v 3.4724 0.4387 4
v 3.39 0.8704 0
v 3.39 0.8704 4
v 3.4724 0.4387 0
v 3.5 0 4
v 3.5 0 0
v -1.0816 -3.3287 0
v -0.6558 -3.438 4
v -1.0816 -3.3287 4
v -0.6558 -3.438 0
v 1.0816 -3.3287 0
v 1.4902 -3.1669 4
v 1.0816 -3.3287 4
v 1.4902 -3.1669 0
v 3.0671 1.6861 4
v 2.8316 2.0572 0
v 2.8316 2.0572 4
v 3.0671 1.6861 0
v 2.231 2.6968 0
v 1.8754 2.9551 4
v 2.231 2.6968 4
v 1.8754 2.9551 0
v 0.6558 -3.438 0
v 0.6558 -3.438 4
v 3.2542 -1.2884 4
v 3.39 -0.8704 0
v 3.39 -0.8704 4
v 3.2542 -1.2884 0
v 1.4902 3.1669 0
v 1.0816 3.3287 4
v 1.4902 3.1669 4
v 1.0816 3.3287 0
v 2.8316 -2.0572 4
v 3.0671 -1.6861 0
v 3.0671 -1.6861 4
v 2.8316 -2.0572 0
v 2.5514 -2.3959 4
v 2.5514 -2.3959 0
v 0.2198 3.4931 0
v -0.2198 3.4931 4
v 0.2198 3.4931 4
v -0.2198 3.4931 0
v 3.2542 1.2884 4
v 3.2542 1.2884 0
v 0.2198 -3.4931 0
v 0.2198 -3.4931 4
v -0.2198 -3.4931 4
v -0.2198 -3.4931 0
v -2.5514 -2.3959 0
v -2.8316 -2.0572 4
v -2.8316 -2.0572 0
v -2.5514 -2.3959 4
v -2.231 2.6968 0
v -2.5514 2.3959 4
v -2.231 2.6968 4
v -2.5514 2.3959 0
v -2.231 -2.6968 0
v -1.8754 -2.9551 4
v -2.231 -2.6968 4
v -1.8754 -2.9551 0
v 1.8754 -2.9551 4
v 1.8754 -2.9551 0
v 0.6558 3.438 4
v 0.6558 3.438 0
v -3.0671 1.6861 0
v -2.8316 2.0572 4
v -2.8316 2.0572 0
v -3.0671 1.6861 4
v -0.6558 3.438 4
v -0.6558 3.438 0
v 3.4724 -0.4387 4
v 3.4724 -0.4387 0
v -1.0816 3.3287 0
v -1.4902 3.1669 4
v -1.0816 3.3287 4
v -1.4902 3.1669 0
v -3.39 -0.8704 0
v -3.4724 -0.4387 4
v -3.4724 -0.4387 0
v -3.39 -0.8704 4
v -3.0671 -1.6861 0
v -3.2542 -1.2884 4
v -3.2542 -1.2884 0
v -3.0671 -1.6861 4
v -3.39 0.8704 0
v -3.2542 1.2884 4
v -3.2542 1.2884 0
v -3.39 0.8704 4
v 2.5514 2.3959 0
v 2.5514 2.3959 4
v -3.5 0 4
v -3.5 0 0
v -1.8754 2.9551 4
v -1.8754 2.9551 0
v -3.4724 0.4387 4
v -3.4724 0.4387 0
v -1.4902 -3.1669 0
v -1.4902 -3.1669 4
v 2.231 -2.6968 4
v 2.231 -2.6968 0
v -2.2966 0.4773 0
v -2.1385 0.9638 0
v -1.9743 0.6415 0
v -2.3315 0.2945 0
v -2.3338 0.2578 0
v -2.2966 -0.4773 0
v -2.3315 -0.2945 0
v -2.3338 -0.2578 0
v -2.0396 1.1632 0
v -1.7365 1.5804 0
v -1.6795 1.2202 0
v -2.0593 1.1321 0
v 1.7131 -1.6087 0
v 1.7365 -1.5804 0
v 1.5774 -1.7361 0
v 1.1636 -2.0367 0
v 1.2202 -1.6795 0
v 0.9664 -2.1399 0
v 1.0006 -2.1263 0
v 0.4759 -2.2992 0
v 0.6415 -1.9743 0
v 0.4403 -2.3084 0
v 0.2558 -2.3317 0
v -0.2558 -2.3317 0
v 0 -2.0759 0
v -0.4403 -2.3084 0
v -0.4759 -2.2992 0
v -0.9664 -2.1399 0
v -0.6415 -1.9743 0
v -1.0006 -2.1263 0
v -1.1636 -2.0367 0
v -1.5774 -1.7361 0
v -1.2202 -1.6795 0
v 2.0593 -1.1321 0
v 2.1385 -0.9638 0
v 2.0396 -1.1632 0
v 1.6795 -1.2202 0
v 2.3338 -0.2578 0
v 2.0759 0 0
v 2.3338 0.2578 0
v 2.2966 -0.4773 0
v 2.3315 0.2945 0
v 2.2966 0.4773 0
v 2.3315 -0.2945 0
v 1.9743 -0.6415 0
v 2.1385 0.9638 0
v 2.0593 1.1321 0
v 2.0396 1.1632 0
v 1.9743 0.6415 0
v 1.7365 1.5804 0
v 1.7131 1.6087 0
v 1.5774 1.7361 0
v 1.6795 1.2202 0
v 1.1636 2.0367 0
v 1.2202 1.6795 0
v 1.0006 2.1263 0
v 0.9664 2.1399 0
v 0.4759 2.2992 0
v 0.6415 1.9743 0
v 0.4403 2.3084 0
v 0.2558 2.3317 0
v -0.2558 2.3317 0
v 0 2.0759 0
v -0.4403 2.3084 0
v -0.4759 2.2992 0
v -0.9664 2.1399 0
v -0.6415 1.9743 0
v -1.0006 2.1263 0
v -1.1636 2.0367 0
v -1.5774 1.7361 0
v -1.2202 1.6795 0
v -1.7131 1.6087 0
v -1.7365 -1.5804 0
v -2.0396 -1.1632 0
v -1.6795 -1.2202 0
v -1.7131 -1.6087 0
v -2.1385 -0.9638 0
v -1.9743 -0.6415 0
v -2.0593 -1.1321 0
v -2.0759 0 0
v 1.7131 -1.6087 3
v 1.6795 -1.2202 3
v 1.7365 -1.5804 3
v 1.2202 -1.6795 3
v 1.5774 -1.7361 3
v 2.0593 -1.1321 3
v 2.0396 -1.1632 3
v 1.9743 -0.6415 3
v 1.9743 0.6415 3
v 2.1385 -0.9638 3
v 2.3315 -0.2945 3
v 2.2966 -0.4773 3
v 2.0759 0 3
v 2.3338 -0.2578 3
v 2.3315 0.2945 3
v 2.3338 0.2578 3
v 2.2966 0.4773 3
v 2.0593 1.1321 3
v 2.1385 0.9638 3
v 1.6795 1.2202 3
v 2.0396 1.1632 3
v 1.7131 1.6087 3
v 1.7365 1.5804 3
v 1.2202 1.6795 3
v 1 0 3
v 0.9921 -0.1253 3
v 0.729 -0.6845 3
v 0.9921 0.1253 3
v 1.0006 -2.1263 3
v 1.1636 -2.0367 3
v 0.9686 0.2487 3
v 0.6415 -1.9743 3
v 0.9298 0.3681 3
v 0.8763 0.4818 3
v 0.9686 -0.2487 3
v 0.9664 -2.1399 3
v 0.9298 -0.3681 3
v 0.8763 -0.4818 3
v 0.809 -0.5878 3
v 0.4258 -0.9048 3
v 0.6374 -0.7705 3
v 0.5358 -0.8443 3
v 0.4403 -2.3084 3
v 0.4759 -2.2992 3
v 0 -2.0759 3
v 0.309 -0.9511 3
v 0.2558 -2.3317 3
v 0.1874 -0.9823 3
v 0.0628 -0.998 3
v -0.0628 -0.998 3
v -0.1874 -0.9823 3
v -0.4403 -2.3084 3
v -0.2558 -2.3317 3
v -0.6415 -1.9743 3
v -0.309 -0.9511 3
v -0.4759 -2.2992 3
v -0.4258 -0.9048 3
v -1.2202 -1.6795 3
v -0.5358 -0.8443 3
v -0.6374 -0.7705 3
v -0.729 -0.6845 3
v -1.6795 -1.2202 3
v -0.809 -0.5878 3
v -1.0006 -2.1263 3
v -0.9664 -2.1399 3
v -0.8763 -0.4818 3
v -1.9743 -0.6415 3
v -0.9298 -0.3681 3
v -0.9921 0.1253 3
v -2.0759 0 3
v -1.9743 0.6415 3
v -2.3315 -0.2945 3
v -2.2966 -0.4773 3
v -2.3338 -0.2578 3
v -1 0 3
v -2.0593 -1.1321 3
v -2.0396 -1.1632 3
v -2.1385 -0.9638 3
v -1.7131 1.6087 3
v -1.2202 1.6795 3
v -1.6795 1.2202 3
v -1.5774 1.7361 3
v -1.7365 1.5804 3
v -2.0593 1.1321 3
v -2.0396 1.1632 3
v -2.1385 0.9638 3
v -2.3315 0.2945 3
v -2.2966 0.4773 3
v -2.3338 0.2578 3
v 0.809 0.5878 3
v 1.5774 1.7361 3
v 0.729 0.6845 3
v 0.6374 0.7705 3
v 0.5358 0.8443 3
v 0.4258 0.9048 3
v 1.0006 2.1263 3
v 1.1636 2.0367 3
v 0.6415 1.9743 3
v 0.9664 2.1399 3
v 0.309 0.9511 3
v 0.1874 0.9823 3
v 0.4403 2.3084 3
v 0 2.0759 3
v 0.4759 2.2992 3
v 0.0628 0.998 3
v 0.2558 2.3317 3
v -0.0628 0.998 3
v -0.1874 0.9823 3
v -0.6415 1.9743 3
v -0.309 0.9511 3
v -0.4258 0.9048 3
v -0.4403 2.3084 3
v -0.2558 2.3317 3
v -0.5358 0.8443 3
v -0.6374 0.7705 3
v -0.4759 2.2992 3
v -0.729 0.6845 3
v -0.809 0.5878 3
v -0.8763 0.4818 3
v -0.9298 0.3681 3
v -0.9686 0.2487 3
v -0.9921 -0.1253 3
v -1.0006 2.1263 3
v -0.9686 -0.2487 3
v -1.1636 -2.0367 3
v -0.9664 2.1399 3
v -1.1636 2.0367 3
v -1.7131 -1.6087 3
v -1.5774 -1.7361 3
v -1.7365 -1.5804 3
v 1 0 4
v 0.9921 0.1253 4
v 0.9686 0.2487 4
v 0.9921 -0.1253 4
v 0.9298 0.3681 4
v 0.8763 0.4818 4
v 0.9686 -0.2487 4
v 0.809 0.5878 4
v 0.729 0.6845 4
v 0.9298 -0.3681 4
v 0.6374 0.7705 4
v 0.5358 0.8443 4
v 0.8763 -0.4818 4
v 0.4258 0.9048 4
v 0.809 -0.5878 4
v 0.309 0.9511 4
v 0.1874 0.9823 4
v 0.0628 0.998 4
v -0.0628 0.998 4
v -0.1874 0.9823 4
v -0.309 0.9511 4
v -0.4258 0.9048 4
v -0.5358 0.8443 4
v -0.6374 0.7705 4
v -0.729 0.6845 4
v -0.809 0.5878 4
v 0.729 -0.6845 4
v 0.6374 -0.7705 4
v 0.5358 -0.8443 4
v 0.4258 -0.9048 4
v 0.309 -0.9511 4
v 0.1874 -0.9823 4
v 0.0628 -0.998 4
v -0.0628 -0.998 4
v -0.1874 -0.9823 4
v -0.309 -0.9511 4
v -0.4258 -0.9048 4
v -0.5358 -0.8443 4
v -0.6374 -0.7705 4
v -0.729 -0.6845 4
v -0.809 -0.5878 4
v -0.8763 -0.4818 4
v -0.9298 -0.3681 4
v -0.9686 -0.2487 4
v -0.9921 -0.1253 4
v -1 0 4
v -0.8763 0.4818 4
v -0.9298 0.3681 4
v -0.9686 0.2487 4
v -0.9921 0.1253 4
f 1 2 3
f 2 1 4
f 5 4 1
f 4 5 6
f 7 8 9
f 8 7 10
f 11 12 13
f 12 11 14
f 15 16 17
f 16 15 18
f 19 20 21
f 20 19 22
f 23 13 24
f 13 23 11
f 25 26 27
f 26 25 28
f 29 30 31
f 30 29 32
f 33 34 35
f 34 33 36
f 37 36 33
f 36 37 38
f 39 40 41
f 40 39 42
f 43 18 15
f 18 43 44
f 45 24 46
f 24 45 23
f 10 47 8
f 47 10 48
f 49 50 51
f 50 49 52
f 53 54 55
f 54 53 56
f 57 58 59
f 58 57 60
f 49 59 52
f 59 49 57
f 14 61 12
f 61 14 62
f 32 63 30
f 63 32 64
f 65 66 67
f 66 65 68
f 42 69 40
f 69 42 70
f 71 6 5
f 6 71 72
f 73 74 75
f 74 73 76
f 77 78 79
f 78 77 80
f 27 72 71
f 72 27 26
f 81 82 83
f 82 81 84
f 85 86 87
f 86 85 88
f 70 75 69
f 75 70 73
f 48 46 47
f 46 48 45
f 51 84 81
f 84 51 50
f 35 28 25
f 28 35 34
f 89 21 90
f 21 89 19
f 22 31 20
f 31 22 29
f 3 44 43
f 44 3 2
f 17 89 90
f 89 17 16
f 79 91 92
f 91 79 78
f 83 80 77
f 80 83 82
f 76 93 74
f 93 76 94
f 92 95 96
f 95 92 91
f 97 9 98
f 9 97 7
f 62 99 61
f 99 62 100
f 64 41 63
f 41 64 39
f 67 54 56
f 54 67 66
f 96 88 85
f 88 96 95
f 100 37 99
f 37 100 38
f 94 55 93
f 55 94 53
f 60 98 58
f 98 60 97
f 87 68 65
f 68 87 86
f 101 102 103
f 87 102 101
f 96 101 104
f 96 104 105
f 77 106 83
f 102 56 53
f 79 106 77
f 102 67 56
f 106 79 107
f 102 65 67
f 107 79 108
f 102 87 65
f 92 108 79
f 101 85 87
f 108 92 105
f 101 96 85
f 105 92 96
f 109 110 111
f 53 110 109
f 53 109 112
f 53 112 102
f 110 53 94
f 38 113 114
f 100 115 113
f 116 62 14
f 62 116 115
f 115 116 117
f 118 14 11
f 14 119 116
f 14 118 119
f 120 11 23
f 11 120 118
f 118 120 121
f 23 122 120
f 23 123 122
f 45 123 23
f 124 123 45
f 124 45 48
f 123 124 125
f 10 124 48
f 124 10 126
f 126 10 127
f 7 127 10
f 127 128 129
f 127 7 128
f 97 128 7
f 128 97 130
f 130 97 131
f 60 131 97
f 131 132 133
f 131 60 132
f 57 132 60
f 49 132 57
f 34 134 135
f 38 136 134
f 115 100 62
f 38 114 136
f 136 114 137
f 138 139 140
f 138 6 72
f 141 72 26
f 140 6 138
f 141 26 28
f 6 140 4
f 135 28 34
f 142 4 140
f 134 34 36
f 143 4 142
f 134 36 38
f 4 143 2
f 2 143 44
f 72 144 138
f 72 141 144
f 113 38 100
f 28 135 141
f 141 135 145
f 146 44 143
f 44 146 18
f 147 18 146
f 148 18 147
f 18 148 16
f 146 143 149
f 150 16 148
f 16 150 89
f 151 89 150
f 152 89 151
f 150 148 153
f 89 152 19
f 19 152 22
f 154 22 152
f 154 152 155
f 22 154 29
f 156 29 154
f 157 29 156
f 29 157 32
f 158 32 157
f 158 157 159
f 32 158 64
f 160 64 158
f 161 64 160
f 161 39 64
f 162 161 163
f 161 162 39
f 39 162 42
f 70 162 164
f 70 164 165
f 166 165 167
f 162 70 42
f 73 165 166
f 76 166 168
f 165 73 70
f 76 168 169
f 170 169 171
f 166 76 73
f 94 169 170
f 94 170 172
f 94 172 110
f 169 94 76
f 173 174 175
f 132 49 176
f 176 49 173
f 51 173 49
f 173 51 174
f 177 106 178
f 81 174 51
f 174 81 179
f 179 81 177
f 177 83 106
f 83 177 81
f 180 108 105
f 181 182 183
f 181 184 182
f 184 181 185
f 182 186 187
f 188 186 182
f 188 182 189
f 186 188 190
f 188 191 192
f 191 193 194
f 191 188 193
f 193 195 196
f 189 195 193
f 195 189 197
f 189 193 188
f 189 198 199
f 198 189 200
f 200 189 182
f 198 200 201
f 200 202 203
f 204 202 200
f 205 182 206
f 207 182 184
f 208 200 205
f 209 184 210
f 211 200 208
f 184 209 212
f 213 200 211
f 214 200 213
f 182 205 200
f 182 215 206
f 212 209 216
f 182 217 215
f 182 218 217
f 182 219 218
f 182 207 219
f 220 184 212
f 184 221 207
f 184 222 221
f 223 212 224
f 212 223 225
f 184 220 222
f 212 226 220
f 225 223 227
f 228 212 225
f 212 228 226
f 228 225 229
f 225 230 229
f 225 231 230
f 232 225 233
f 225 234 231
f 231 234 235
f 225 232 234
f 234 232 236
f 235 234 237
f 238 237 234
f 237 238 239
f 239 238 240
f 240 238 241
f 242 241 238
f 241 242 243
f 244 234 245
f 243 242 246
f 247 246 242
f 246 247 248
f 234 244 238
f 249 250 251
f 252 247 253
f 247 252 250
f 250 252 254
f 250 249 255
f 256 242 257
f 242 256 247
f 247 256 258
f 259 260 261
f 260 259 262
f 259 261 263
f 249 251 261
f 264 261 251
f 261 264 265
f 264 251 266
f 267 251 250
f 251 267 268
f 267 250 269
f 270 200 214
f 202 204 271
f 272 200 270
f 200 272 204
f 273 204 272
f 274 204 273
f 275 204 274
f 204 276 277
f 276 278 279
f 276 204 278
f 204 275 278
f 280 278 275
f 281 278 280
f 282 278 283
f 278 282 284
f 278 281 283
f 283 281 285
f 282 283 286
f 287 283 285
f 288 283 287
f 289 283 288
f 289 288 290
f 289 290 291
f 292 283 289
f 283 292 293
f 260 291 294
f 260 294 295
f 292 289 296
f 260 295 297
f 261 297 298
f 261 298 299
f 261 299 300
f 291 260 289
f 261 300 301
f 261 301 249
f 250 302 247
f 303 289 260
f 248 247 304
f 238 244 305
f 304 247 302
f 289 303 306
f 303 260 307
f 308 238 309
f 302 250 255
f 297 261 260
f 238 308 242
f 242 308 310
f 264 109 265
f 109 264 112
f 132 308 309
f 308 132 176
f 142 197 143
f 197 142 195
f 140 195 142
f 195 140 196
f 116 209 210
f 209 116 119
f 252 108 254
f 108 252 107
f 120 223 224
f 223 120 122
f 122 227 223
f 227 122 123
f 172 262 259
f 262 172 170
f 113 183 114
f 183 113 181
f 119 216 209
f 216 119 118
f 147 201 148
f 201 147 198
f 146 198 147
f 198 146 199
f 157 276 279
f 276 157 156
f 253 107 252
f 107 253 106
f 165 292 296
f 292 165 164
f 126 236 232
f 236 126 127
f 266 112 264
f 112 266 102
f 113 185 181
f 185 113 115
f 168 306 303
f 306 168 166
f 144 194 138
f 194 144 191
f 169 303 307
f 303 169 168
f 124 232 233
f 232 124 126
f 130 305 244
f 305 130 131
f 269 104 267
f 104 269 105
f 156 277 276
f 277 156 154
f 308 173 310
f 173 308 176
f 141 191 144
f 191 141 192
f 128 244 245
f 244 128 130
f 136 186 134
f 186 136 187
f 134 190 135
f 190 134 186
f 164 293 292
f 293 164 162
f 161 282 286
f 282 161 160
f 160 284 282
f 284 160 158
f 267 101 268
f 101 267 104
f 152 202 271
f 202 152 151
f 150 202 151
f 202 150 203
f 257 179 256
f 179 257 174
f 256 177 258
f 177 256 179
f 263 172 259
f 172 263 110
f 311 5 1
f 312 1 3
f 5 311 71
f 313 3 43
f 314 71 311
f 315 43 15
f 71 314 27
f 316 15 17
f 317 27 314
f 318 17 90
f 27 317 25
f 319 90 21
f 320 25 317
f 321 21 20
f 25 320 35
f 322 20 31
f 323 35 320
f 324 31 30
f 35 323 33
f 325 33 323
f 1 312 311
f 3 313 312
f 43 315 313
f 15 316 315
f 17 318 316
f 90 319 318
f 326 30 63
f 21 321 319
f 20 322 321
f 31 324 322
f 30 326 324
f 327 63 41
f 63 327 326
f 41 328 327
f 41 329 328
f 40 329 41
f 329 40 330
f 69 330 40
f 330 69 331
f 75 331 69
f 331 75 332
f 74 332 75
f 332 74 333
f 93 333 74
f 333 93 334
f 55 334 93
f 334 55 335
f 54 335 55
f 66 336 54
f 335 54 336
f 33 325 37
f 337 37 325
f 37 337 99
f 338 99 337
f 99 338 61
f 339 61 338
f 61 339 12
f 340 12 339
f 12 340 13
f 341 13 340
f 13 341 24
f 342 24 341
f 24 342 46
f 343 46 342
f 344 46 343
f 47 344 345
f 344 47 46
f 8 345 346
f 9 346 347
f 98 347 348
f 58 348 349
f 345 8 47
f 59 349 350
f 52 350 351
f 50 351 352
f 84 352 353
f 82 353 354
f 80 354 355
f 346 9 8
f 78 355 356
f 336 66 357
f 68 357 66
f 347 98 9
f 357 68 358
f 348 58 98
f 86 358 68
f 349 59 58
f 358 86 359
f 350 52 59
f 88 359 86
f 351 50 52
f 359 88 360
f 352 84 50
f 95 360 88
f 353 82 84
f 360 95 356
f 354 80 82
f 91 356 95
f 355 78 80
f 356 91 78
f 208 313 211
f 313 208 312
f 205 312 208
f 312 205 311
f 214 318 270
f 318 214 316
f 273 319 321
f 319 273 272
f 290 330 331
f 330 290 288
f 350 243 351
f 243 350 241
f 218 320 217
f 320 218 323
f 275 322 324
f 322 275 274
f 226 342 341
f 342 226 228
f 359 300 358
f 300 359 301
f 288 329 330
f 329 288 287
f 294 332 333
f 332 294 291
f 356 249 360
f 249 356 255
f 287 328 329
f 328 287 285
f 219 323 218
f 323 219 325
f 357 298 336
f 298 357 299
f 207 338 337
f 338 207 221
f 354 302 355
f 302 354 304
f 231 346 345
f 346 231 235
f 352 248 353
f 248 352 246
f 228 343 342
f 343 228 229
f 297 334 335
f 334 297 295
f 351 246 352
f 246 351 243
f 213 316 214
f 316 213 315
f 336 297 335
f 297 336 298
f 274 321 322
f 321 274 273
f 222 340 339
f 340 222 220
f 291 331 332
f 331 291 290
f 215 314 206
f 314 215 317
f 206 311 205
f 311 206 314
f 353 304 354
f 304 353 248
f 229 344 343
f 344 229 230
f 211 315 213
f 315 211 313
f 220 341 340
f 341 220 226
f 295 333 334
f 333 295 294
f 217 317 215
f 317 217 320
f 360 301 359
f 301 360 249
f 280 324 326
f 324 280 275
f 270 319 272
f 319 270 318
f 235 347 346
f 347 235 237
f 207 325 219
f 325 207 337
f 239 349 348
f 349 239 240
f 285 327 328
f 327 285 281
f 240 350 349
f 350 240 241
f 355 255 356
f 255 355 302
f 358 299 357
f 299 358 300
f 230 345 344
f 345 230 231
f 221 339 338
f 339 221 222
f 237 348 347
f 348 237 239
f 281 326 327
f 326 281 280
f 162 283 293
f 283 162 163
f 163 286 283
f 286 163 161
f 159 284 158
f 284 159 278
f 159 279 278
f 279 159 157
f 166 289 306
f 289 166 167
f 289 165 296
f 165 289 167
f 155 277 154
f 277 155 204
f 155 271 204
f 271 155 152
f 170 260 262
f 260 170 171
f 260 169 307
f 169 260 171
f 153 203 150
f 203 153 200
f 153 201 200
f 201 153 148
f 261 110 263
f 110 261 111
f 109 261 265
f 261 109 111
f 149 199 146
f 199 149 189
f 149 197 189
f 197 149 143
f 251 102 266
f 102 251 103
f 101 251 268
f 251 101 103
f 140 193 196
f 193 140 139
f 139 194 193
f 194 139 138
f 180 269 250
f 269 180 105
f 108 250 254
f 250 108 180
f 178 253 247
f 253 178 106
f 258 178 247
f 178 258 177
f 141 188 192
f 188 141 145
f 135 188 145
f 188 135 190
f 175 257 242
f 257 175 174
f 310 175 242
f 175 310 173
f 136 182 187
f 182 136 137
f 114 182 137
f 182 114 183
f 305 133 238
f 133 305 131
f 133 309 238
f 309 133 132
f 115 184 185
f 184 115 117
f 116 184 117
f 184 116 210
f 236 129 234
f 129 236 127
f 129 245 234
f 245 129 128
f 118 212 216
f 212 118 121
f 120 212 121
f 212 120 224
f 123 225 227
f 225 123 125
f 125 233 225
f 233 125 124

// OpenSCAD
/*
Copyright (c) 2017 Paul Austin - SDG

Permission is hereby granted, free of charge, to any person obtaining a copy
of this software and associated documentation files (the "Software"), to deal
in the Software without restriction, including without limitation the rights
to use, copy, modify, merge, publish, distribute, sublicense, and/or sell
copies of the Software, and to permit persons to whom the Software is
furnished to do so, subject to the following conditions:

The above copyright notice and this permission notice shall be included in all
copies or substantial portions of the Software.

THE SOFTWARE IS PROVIDED "AS IS", WITHOUT WARRANTY OF ANY KIND, EXPRESS OR
IMPLIED, INCLUDING BUT NOT LIMITED TO THE WARRANTIES OF MERCHANTABILITY,
FITNESS FOR A PARTICULAR PURPOSE AND NONINFRINGEMENT. IN NO EVENT SHALL THE
AUTHORS OR COPYRIGHT HOLDERS BE LIABLE FOR ANY CLAIM, DAMAGES OR OTHER
LIABILITY, WHETHER IN AN ACTION OF CONTRACT, TORT OR OTHERWISE, ARISING FROM,
OUT OF OR IN CONNECTION WITH THE SOFTWARE OR THE USE OR OTHER DEALINGS IN THE
SOFTWARE.
*/

$fn = 50;

module coreHub(spineCount = 20, coreH = 4, splineH = 3, d = 7) {
    
    
    // Approx spline shaft diameters
    // sg90(subMicro) - 5mm
    // micro          - 6mm
    

    // The main shaft hub
    difference() {
        cylinder(d=d, h=splineH);
        cylinder(d=4.7, h=splineH);
    }

    // Hole for the screw
    difference() {    
        translate([0,0,splineH]) cylinder(d=d,0,h=1);
        translate([0,0,splineH]) cylinder(d=2,h=1);
    }
    
    // Splines on the inside of the hub
    color("red") linear_extrude(splineH)
    for ( rib = [0:(360/spineCount):360]) {
        // Pivot aroung origin
        rotate([0,0,rib])
        // Move out from origin
        translate([2.38,0,0])
        // Make corner face origin
        rotate([0,0,45])
        // Make a square
        square([0.43,0.43], center = true);
    }
}
#coreHub(coreH = 5);
